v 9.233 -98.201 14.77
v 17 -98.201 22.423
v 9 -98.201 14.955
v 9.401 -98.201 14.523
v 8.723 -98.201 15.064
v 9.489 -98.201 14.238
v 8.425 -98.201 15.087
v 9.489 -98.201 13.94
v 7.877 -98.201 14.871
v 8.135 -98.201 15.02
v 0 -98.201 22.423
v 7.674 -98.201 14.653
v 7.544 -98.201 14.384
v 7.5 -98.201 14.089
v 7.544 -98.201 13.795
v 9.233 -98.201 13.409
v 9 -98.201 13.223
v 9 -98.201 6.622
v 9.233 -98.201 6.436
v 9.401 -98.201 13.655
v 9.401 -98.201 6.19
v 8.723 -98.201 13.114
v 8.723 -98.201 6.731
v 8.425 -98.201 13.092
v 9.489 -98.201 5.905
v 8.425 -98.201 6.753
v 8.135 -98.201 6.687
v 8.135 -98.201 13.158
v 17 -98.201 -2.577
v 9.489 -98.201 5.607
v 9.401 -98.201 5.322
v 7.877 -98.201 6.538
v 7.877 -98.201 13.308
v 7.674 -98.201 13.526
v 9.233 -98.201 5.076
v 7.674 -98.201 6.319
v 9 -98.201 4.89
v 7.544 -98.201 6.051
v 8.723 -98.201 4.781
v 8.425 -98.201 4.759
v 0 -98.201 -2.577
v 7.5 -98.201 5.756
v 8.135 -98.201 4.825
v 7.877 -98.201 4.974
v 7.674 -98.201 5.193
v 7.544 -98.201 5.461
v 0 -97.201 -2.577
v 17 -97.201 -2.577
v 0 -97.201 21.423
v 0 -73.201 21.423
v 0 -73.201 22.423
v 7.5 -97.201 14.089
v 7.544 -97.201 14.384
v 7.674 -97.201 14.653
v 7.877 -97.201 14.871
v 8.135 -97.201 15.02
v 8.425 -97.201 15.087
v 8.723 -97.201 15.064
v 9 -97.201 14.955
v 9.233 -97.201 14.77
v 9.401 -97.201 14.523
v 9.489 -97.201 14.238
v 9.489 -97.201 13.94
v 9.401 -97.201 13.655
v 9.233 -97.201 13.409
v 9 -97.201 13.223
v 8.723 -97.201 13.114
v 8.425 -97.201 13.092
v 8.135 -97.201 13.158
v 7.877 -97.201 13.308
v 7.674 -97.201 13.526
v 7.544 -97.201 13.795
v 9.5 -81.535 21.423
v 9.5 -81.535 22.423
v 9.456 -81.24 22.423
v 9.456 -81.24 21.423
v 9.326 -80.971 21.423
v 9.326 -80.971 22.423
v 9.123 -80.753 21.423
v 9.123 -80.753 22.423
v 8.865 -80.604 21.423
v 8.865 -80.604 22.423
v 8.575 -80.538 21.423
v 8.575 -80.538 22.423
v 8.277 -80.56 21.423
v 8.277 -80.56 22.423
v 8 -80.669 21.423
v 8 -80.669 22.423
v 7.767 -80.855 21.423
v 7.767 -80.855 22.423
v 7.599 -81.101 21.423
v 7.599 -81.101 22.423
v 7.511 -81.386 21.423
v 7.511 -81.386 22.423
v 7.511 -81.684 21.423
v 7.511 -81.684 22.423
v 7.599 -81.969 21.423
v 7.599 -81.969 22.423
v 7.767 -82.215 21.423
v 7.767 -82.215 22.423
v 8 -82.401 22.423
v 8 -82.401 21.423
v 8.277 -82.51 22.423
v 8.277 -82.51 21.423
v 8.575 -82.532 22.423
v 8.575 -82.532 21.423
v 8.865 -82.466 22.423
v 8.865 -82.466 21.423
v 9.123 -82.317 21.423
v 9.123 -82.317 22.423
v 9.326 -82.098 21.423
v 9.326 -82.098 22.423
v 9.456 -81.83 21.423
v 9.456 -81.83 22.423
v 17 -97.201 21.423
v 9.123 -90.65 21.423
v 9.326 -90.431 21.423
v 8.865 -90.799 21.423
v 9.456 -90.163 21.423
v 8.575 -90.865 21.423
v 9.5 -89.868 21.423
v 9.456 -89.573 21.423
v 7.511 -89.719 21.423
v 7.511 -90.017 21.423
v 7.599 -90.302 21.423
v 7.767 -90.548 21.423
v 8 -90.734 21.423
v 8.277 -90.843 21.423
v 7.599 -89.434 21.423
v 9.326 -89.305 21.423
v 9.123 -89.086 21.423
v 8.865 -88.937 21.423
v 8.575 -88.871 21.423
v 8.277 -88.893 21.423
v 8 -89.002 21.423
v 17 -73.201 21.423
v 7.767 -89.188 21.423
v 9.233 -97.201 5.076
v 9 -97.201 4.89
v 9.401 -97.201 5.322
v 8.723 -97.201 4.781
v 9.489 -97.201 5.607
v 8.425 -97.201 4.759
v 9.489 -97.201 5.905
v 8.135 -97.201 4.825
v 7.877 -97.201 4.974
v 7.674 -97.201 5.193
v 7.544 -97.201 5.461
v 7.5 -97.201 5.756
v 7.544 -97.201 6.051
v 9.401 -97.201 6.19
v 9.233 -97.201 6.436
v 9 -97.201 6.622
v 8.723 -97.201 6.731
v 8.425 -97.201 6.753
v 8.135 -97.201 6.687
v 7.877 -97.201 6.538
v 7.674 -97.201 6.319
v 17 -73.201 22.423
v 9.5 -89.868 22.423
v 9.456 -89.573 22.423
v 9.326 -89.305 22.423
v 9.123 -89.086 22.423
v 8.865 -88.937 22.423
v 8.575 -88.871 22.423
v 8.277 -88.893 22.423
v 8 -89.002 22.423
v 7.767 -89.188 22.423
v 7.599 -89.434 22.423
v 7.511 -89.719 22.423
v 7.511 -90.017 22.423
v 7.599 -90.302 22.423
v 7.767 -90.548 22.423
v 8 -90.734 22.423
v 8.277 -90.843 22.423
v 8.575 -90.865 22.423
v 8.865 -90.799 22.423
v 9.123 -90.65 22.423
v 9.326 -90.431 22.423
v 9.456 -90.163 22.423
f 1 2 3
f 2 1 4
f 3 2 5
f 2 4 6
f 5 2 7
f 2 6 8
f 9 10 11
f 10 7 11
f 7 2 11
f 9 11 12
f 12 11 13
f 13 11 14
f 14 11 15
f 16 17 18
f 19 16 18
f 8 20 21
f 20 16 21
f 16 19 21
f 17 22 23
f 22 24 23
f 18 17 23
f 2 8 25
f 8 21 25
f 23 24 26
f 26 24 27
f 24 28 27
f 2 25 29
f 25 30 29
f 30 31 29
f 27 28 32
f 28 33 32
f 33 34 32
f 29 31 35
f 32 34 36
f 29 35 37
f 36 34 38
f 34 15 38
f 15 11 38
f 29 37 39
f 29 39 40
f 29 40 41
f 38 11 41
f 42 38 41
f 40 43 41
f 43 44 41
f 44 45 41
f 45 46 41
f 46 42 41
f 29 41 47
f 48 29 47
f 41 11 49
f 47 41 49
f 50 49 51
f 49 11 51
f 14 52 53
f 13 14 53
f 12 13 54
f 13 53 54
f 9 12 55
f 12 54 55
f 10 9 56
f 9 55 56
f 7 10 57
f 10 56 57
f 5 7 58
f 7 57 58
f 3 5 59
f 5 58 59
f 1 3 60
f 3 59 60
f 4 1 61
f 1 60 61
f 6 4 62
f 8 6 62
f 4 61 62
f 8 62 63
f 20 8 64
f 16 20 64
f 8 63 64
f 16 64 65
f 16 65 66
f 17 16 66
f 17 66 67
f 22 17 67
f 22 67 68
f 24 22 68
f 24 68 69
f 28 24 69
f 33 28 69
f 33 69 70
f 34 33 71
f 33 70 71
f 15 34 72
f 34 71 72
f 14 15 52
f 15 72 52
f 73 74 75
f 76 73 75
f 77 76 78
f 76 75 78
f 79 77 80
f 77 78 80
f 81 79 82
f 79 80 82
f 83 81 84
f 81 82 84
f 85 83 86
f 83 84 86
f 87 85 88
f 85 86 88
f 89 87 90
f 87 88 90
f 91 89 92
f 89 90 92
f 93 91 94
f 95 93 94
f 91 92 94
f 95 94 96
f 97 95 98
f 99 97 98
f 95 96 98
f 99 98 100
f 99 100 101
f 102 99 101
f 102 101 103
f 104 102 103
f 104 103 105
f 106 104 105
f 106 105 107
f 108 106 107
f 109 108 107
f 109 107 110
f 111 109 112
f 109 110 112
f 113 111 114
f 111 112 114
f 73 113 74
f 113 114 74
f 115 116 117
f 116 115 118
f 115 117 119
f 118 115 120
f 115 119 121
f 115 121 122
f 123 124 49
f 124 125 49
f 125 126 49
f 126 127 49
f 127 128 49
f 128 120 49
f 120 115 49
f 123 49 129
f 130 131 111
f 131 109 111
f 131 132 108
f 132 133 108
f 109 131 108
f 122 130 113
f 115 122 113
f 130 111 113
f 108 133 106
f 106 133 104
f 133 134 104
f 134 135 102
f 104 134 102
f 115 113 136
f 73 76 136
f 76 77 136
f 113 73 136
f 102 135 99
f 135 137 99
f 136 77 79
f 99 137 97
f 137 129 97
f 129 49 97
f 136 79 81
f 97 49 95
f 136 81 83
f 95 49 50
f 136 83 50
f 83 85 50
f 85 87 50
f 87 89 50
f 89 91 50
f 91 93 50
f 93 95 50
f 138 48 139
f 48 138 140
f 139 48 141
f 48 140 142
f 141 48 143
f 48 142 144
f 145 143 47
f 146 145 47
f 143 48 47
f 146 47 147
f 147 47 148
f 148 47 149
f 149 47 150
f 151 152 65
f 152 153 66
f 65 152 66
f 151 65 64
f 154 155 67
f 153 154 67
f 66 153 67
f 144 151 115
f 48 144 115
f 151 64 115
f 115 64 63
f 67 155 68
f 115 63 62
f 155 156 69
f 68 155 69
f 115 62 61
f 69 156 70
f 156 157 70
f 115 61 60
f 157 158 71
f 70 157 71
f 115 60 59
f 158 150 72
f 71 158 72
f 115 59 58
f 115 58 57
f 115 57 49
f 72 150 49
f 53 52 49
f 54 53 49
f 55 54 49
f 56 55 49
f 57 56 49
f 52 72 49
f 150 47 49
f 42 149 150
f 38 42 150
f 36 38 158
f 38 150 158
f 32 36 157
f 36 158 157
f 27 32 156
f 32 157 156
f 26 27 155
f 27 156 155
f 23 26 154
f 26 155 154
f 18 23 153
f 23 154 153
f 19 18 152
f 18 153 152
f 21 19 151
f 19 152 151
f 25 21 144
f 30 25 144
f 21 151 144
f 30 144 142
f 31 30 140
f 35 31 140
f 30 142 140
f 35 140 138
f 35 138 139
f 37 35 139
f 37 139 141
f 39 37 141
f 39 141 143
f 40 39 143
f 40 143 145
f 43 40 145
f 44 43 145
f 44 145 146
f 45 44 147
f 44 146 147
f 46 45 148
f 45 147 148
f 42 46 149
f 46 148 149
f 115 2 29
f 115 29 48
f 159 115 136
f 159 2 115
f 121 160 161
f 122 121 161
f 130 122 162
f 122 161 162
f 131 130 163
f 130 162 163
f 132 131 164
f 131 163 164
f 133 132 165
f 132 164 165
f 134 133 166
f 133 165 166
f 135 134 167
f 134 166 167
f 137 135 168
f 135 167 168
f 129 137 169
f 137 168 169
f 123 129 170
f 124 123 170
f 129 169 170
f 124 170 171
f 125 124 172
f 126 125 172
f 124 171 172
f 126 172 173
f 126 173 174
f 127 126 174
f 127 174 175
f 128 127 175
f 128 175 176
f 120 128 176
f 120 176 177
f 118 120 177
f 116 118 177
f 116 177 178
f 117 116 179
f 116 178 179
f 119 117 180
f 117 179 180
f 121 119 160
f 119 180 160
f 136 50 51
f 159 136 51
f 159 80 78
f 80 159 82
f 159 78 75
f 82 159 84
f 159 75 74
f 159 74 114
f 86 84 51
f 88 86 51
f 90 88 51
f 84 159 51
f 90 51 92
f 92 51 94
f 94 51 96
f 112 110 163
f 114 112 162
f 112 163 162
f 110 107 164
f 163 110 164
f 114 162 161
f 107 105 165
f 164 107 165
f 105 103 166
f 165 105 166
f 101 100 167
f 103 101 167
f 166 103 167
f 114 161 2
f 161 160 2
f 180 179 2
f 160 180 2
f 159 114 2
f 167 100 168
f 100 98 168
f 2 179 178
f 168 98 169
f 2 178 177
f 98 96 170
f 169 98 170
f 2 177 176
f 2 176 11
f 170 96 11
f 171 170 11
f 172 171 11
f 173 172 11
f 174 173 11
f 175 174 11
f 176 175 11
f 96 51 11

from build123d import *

# Parameters (mm, degrees)
F1_DEPTH = 17
F2_R     = 1
F3_DEPTH = 1
F4_R     = 1
F5_DEPTH = 1


with BuildPart() as f1:
    # F0 (on Right) → F1 (new body)
    with BuildSketch(Plane.YZ):
        Polygon((-73.201425, 22.422691), (-98.201425, 22.422691), (-98.201425, -2.577309), (-97.201425, -2.577309), (-97.201425, 21.422691), (-73.201425, 21.422691), align=None)
    extrude(amount=F1_DEPTH)

    # F2 (on face) → F3 (cut)
    with BuildSketch(Plane(origin=(0, -97.201425, 0), x_dir=(-1, 0, 0), z_dir=(0, 1, 0))):
        with Locations((-8.5, 5.756025)):
            Circle(F2_R)
        with Locations((-8.5, 14.089358)):
            Circle(F2_R)
    extrude(amount=-F3_DEPTH, mode=Mode.SUBTRACT)

    # F4 (on face) → F5 (cut)
    with BuildSketch(Plane.XY.offset(22.422691)):
        with Locations((8.5, -81.534759)):
            Circle(F4_R)
        with Locations((8.5, -89.868092)):
            Circle(F4_R)
    extrude(amount=-F5_DEPTH, mode=Mode.SUBTRACT)


solid = f1.part
